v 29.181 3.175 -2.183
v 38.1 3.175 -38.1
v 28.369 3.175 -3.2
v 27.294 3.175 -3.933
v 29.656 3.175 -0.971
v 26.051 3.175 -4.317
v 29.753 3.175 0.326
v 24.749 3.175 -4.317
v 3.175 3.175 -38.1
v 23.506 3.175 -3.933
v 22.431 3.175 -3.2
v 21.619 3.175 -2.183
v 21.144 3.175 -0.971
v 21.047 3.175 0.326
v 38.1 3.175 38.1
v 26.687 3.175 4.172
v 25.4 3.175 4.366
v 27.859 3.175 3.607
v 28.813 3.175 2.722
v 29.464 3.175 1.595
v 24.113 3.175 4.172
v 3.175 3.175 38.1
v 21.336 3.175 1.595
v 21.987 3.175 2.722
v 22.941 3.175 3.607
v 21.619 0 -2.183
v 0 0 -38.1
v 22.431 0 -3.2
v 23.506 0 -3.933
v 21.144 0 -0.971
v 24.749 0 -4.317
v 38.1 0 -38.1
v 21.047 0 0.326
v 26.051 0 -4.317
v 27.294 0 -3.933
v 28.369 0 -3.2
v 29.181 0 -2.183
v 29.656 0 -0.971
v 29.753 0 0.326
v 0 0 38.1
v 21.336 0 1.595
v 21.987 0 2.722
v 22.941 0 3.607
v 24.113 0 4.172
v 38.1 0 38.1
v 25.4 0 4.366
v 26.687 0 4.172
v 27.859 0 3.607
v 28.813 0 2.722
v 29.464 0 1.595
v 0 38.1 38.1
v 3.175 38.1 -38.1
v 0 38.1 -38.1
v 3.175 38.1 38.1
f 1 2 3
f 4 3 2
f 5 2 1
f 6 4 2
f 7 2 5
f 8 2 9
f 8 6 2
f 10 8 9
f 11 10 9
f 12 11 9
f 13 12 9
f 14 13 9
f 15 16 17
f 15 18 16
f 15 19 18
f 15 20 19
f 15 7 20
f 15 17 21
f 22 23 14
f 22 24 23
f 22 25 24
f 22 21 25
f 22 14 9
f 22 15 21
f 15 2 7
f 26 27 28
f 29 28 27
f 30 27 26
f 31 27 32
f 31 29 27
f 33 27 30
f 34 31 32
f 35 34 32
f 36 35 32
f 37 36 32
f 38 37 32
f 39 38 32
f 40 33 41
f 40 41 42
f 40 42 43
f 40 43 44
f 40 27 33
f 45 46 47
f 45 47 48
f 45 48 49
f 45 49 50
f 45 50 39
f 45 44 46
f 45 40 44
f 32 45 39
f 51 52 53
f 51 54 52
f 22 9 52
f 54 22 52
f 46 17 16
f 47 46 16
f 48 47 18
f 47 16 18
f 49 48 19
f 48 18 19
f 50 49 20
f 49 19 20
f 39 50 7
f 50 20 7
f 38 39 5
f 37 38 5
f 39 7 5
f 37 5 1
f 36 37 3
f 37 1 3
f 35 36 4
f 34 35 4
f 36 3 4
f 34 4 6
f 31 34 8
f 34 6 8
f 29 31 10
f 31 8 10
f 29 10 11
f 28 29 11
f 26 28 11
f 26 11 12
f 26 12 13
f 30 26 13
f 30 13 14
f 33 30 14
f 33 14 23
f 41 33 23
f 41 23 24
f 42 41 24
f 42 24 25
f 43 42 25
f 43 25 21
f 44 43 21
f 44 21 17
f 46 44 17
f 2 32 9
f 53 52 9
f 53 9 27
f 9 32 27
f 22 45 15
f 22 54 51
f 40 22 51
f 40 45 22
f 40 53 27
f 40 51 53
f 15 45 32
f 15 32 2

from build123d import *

# Parameters (mm, degrees)
BOSS_EXTRUDE1_DEPTH = 38.1
CUT_EXTRUDE1_REACH  = 5.175
SKETCH3_R           = 4.365625


with BuildPart() as part:
    # Sketch1 → Boss-Extrude1 (new body, symmetric)
    with BuildSketch(Plane(origin=(0, 0, 0), x_dir=(-1, 0, 0), z_dir=(0, 0, 1))):
        Polygon((0, 0), (-38.1, 0), (-38.1, -3.175), (-3.175, -3.175), (-3.175, -38.1), (0, -38.1), align=None)
    extrude(amount=BOSS_EXTRUDE1_DEPTH, both=True)

    # Sketch3 → Cut-Extrude1 (cut, up to next)
    with BuildSketch(Plane(origin=(0, 3.175, 0), x_dir=(1, 0, 0), z_dir=(0, 1, 0)), mode=Mode.PRIVATE) as cut_extrude1_sk1:
        with Locations(Location((25.4, 0, 0), (0, 0, 270))):  # turned: the seam where the file's is
            Circle(SKETCH3_R)
    cut_extrude1_tool1 = extrude(cut_extrude1_sk1.sketch, amount=-CUT_EXTRUDE1_REACH, mode=Mode.PRIVATE) & part.part
    add(cut_extrude1_tool1.solids().sort_by_distance((25.4, 3.175, 0))[0], mode=Mode.SUBTRACT)


solid = part.part
